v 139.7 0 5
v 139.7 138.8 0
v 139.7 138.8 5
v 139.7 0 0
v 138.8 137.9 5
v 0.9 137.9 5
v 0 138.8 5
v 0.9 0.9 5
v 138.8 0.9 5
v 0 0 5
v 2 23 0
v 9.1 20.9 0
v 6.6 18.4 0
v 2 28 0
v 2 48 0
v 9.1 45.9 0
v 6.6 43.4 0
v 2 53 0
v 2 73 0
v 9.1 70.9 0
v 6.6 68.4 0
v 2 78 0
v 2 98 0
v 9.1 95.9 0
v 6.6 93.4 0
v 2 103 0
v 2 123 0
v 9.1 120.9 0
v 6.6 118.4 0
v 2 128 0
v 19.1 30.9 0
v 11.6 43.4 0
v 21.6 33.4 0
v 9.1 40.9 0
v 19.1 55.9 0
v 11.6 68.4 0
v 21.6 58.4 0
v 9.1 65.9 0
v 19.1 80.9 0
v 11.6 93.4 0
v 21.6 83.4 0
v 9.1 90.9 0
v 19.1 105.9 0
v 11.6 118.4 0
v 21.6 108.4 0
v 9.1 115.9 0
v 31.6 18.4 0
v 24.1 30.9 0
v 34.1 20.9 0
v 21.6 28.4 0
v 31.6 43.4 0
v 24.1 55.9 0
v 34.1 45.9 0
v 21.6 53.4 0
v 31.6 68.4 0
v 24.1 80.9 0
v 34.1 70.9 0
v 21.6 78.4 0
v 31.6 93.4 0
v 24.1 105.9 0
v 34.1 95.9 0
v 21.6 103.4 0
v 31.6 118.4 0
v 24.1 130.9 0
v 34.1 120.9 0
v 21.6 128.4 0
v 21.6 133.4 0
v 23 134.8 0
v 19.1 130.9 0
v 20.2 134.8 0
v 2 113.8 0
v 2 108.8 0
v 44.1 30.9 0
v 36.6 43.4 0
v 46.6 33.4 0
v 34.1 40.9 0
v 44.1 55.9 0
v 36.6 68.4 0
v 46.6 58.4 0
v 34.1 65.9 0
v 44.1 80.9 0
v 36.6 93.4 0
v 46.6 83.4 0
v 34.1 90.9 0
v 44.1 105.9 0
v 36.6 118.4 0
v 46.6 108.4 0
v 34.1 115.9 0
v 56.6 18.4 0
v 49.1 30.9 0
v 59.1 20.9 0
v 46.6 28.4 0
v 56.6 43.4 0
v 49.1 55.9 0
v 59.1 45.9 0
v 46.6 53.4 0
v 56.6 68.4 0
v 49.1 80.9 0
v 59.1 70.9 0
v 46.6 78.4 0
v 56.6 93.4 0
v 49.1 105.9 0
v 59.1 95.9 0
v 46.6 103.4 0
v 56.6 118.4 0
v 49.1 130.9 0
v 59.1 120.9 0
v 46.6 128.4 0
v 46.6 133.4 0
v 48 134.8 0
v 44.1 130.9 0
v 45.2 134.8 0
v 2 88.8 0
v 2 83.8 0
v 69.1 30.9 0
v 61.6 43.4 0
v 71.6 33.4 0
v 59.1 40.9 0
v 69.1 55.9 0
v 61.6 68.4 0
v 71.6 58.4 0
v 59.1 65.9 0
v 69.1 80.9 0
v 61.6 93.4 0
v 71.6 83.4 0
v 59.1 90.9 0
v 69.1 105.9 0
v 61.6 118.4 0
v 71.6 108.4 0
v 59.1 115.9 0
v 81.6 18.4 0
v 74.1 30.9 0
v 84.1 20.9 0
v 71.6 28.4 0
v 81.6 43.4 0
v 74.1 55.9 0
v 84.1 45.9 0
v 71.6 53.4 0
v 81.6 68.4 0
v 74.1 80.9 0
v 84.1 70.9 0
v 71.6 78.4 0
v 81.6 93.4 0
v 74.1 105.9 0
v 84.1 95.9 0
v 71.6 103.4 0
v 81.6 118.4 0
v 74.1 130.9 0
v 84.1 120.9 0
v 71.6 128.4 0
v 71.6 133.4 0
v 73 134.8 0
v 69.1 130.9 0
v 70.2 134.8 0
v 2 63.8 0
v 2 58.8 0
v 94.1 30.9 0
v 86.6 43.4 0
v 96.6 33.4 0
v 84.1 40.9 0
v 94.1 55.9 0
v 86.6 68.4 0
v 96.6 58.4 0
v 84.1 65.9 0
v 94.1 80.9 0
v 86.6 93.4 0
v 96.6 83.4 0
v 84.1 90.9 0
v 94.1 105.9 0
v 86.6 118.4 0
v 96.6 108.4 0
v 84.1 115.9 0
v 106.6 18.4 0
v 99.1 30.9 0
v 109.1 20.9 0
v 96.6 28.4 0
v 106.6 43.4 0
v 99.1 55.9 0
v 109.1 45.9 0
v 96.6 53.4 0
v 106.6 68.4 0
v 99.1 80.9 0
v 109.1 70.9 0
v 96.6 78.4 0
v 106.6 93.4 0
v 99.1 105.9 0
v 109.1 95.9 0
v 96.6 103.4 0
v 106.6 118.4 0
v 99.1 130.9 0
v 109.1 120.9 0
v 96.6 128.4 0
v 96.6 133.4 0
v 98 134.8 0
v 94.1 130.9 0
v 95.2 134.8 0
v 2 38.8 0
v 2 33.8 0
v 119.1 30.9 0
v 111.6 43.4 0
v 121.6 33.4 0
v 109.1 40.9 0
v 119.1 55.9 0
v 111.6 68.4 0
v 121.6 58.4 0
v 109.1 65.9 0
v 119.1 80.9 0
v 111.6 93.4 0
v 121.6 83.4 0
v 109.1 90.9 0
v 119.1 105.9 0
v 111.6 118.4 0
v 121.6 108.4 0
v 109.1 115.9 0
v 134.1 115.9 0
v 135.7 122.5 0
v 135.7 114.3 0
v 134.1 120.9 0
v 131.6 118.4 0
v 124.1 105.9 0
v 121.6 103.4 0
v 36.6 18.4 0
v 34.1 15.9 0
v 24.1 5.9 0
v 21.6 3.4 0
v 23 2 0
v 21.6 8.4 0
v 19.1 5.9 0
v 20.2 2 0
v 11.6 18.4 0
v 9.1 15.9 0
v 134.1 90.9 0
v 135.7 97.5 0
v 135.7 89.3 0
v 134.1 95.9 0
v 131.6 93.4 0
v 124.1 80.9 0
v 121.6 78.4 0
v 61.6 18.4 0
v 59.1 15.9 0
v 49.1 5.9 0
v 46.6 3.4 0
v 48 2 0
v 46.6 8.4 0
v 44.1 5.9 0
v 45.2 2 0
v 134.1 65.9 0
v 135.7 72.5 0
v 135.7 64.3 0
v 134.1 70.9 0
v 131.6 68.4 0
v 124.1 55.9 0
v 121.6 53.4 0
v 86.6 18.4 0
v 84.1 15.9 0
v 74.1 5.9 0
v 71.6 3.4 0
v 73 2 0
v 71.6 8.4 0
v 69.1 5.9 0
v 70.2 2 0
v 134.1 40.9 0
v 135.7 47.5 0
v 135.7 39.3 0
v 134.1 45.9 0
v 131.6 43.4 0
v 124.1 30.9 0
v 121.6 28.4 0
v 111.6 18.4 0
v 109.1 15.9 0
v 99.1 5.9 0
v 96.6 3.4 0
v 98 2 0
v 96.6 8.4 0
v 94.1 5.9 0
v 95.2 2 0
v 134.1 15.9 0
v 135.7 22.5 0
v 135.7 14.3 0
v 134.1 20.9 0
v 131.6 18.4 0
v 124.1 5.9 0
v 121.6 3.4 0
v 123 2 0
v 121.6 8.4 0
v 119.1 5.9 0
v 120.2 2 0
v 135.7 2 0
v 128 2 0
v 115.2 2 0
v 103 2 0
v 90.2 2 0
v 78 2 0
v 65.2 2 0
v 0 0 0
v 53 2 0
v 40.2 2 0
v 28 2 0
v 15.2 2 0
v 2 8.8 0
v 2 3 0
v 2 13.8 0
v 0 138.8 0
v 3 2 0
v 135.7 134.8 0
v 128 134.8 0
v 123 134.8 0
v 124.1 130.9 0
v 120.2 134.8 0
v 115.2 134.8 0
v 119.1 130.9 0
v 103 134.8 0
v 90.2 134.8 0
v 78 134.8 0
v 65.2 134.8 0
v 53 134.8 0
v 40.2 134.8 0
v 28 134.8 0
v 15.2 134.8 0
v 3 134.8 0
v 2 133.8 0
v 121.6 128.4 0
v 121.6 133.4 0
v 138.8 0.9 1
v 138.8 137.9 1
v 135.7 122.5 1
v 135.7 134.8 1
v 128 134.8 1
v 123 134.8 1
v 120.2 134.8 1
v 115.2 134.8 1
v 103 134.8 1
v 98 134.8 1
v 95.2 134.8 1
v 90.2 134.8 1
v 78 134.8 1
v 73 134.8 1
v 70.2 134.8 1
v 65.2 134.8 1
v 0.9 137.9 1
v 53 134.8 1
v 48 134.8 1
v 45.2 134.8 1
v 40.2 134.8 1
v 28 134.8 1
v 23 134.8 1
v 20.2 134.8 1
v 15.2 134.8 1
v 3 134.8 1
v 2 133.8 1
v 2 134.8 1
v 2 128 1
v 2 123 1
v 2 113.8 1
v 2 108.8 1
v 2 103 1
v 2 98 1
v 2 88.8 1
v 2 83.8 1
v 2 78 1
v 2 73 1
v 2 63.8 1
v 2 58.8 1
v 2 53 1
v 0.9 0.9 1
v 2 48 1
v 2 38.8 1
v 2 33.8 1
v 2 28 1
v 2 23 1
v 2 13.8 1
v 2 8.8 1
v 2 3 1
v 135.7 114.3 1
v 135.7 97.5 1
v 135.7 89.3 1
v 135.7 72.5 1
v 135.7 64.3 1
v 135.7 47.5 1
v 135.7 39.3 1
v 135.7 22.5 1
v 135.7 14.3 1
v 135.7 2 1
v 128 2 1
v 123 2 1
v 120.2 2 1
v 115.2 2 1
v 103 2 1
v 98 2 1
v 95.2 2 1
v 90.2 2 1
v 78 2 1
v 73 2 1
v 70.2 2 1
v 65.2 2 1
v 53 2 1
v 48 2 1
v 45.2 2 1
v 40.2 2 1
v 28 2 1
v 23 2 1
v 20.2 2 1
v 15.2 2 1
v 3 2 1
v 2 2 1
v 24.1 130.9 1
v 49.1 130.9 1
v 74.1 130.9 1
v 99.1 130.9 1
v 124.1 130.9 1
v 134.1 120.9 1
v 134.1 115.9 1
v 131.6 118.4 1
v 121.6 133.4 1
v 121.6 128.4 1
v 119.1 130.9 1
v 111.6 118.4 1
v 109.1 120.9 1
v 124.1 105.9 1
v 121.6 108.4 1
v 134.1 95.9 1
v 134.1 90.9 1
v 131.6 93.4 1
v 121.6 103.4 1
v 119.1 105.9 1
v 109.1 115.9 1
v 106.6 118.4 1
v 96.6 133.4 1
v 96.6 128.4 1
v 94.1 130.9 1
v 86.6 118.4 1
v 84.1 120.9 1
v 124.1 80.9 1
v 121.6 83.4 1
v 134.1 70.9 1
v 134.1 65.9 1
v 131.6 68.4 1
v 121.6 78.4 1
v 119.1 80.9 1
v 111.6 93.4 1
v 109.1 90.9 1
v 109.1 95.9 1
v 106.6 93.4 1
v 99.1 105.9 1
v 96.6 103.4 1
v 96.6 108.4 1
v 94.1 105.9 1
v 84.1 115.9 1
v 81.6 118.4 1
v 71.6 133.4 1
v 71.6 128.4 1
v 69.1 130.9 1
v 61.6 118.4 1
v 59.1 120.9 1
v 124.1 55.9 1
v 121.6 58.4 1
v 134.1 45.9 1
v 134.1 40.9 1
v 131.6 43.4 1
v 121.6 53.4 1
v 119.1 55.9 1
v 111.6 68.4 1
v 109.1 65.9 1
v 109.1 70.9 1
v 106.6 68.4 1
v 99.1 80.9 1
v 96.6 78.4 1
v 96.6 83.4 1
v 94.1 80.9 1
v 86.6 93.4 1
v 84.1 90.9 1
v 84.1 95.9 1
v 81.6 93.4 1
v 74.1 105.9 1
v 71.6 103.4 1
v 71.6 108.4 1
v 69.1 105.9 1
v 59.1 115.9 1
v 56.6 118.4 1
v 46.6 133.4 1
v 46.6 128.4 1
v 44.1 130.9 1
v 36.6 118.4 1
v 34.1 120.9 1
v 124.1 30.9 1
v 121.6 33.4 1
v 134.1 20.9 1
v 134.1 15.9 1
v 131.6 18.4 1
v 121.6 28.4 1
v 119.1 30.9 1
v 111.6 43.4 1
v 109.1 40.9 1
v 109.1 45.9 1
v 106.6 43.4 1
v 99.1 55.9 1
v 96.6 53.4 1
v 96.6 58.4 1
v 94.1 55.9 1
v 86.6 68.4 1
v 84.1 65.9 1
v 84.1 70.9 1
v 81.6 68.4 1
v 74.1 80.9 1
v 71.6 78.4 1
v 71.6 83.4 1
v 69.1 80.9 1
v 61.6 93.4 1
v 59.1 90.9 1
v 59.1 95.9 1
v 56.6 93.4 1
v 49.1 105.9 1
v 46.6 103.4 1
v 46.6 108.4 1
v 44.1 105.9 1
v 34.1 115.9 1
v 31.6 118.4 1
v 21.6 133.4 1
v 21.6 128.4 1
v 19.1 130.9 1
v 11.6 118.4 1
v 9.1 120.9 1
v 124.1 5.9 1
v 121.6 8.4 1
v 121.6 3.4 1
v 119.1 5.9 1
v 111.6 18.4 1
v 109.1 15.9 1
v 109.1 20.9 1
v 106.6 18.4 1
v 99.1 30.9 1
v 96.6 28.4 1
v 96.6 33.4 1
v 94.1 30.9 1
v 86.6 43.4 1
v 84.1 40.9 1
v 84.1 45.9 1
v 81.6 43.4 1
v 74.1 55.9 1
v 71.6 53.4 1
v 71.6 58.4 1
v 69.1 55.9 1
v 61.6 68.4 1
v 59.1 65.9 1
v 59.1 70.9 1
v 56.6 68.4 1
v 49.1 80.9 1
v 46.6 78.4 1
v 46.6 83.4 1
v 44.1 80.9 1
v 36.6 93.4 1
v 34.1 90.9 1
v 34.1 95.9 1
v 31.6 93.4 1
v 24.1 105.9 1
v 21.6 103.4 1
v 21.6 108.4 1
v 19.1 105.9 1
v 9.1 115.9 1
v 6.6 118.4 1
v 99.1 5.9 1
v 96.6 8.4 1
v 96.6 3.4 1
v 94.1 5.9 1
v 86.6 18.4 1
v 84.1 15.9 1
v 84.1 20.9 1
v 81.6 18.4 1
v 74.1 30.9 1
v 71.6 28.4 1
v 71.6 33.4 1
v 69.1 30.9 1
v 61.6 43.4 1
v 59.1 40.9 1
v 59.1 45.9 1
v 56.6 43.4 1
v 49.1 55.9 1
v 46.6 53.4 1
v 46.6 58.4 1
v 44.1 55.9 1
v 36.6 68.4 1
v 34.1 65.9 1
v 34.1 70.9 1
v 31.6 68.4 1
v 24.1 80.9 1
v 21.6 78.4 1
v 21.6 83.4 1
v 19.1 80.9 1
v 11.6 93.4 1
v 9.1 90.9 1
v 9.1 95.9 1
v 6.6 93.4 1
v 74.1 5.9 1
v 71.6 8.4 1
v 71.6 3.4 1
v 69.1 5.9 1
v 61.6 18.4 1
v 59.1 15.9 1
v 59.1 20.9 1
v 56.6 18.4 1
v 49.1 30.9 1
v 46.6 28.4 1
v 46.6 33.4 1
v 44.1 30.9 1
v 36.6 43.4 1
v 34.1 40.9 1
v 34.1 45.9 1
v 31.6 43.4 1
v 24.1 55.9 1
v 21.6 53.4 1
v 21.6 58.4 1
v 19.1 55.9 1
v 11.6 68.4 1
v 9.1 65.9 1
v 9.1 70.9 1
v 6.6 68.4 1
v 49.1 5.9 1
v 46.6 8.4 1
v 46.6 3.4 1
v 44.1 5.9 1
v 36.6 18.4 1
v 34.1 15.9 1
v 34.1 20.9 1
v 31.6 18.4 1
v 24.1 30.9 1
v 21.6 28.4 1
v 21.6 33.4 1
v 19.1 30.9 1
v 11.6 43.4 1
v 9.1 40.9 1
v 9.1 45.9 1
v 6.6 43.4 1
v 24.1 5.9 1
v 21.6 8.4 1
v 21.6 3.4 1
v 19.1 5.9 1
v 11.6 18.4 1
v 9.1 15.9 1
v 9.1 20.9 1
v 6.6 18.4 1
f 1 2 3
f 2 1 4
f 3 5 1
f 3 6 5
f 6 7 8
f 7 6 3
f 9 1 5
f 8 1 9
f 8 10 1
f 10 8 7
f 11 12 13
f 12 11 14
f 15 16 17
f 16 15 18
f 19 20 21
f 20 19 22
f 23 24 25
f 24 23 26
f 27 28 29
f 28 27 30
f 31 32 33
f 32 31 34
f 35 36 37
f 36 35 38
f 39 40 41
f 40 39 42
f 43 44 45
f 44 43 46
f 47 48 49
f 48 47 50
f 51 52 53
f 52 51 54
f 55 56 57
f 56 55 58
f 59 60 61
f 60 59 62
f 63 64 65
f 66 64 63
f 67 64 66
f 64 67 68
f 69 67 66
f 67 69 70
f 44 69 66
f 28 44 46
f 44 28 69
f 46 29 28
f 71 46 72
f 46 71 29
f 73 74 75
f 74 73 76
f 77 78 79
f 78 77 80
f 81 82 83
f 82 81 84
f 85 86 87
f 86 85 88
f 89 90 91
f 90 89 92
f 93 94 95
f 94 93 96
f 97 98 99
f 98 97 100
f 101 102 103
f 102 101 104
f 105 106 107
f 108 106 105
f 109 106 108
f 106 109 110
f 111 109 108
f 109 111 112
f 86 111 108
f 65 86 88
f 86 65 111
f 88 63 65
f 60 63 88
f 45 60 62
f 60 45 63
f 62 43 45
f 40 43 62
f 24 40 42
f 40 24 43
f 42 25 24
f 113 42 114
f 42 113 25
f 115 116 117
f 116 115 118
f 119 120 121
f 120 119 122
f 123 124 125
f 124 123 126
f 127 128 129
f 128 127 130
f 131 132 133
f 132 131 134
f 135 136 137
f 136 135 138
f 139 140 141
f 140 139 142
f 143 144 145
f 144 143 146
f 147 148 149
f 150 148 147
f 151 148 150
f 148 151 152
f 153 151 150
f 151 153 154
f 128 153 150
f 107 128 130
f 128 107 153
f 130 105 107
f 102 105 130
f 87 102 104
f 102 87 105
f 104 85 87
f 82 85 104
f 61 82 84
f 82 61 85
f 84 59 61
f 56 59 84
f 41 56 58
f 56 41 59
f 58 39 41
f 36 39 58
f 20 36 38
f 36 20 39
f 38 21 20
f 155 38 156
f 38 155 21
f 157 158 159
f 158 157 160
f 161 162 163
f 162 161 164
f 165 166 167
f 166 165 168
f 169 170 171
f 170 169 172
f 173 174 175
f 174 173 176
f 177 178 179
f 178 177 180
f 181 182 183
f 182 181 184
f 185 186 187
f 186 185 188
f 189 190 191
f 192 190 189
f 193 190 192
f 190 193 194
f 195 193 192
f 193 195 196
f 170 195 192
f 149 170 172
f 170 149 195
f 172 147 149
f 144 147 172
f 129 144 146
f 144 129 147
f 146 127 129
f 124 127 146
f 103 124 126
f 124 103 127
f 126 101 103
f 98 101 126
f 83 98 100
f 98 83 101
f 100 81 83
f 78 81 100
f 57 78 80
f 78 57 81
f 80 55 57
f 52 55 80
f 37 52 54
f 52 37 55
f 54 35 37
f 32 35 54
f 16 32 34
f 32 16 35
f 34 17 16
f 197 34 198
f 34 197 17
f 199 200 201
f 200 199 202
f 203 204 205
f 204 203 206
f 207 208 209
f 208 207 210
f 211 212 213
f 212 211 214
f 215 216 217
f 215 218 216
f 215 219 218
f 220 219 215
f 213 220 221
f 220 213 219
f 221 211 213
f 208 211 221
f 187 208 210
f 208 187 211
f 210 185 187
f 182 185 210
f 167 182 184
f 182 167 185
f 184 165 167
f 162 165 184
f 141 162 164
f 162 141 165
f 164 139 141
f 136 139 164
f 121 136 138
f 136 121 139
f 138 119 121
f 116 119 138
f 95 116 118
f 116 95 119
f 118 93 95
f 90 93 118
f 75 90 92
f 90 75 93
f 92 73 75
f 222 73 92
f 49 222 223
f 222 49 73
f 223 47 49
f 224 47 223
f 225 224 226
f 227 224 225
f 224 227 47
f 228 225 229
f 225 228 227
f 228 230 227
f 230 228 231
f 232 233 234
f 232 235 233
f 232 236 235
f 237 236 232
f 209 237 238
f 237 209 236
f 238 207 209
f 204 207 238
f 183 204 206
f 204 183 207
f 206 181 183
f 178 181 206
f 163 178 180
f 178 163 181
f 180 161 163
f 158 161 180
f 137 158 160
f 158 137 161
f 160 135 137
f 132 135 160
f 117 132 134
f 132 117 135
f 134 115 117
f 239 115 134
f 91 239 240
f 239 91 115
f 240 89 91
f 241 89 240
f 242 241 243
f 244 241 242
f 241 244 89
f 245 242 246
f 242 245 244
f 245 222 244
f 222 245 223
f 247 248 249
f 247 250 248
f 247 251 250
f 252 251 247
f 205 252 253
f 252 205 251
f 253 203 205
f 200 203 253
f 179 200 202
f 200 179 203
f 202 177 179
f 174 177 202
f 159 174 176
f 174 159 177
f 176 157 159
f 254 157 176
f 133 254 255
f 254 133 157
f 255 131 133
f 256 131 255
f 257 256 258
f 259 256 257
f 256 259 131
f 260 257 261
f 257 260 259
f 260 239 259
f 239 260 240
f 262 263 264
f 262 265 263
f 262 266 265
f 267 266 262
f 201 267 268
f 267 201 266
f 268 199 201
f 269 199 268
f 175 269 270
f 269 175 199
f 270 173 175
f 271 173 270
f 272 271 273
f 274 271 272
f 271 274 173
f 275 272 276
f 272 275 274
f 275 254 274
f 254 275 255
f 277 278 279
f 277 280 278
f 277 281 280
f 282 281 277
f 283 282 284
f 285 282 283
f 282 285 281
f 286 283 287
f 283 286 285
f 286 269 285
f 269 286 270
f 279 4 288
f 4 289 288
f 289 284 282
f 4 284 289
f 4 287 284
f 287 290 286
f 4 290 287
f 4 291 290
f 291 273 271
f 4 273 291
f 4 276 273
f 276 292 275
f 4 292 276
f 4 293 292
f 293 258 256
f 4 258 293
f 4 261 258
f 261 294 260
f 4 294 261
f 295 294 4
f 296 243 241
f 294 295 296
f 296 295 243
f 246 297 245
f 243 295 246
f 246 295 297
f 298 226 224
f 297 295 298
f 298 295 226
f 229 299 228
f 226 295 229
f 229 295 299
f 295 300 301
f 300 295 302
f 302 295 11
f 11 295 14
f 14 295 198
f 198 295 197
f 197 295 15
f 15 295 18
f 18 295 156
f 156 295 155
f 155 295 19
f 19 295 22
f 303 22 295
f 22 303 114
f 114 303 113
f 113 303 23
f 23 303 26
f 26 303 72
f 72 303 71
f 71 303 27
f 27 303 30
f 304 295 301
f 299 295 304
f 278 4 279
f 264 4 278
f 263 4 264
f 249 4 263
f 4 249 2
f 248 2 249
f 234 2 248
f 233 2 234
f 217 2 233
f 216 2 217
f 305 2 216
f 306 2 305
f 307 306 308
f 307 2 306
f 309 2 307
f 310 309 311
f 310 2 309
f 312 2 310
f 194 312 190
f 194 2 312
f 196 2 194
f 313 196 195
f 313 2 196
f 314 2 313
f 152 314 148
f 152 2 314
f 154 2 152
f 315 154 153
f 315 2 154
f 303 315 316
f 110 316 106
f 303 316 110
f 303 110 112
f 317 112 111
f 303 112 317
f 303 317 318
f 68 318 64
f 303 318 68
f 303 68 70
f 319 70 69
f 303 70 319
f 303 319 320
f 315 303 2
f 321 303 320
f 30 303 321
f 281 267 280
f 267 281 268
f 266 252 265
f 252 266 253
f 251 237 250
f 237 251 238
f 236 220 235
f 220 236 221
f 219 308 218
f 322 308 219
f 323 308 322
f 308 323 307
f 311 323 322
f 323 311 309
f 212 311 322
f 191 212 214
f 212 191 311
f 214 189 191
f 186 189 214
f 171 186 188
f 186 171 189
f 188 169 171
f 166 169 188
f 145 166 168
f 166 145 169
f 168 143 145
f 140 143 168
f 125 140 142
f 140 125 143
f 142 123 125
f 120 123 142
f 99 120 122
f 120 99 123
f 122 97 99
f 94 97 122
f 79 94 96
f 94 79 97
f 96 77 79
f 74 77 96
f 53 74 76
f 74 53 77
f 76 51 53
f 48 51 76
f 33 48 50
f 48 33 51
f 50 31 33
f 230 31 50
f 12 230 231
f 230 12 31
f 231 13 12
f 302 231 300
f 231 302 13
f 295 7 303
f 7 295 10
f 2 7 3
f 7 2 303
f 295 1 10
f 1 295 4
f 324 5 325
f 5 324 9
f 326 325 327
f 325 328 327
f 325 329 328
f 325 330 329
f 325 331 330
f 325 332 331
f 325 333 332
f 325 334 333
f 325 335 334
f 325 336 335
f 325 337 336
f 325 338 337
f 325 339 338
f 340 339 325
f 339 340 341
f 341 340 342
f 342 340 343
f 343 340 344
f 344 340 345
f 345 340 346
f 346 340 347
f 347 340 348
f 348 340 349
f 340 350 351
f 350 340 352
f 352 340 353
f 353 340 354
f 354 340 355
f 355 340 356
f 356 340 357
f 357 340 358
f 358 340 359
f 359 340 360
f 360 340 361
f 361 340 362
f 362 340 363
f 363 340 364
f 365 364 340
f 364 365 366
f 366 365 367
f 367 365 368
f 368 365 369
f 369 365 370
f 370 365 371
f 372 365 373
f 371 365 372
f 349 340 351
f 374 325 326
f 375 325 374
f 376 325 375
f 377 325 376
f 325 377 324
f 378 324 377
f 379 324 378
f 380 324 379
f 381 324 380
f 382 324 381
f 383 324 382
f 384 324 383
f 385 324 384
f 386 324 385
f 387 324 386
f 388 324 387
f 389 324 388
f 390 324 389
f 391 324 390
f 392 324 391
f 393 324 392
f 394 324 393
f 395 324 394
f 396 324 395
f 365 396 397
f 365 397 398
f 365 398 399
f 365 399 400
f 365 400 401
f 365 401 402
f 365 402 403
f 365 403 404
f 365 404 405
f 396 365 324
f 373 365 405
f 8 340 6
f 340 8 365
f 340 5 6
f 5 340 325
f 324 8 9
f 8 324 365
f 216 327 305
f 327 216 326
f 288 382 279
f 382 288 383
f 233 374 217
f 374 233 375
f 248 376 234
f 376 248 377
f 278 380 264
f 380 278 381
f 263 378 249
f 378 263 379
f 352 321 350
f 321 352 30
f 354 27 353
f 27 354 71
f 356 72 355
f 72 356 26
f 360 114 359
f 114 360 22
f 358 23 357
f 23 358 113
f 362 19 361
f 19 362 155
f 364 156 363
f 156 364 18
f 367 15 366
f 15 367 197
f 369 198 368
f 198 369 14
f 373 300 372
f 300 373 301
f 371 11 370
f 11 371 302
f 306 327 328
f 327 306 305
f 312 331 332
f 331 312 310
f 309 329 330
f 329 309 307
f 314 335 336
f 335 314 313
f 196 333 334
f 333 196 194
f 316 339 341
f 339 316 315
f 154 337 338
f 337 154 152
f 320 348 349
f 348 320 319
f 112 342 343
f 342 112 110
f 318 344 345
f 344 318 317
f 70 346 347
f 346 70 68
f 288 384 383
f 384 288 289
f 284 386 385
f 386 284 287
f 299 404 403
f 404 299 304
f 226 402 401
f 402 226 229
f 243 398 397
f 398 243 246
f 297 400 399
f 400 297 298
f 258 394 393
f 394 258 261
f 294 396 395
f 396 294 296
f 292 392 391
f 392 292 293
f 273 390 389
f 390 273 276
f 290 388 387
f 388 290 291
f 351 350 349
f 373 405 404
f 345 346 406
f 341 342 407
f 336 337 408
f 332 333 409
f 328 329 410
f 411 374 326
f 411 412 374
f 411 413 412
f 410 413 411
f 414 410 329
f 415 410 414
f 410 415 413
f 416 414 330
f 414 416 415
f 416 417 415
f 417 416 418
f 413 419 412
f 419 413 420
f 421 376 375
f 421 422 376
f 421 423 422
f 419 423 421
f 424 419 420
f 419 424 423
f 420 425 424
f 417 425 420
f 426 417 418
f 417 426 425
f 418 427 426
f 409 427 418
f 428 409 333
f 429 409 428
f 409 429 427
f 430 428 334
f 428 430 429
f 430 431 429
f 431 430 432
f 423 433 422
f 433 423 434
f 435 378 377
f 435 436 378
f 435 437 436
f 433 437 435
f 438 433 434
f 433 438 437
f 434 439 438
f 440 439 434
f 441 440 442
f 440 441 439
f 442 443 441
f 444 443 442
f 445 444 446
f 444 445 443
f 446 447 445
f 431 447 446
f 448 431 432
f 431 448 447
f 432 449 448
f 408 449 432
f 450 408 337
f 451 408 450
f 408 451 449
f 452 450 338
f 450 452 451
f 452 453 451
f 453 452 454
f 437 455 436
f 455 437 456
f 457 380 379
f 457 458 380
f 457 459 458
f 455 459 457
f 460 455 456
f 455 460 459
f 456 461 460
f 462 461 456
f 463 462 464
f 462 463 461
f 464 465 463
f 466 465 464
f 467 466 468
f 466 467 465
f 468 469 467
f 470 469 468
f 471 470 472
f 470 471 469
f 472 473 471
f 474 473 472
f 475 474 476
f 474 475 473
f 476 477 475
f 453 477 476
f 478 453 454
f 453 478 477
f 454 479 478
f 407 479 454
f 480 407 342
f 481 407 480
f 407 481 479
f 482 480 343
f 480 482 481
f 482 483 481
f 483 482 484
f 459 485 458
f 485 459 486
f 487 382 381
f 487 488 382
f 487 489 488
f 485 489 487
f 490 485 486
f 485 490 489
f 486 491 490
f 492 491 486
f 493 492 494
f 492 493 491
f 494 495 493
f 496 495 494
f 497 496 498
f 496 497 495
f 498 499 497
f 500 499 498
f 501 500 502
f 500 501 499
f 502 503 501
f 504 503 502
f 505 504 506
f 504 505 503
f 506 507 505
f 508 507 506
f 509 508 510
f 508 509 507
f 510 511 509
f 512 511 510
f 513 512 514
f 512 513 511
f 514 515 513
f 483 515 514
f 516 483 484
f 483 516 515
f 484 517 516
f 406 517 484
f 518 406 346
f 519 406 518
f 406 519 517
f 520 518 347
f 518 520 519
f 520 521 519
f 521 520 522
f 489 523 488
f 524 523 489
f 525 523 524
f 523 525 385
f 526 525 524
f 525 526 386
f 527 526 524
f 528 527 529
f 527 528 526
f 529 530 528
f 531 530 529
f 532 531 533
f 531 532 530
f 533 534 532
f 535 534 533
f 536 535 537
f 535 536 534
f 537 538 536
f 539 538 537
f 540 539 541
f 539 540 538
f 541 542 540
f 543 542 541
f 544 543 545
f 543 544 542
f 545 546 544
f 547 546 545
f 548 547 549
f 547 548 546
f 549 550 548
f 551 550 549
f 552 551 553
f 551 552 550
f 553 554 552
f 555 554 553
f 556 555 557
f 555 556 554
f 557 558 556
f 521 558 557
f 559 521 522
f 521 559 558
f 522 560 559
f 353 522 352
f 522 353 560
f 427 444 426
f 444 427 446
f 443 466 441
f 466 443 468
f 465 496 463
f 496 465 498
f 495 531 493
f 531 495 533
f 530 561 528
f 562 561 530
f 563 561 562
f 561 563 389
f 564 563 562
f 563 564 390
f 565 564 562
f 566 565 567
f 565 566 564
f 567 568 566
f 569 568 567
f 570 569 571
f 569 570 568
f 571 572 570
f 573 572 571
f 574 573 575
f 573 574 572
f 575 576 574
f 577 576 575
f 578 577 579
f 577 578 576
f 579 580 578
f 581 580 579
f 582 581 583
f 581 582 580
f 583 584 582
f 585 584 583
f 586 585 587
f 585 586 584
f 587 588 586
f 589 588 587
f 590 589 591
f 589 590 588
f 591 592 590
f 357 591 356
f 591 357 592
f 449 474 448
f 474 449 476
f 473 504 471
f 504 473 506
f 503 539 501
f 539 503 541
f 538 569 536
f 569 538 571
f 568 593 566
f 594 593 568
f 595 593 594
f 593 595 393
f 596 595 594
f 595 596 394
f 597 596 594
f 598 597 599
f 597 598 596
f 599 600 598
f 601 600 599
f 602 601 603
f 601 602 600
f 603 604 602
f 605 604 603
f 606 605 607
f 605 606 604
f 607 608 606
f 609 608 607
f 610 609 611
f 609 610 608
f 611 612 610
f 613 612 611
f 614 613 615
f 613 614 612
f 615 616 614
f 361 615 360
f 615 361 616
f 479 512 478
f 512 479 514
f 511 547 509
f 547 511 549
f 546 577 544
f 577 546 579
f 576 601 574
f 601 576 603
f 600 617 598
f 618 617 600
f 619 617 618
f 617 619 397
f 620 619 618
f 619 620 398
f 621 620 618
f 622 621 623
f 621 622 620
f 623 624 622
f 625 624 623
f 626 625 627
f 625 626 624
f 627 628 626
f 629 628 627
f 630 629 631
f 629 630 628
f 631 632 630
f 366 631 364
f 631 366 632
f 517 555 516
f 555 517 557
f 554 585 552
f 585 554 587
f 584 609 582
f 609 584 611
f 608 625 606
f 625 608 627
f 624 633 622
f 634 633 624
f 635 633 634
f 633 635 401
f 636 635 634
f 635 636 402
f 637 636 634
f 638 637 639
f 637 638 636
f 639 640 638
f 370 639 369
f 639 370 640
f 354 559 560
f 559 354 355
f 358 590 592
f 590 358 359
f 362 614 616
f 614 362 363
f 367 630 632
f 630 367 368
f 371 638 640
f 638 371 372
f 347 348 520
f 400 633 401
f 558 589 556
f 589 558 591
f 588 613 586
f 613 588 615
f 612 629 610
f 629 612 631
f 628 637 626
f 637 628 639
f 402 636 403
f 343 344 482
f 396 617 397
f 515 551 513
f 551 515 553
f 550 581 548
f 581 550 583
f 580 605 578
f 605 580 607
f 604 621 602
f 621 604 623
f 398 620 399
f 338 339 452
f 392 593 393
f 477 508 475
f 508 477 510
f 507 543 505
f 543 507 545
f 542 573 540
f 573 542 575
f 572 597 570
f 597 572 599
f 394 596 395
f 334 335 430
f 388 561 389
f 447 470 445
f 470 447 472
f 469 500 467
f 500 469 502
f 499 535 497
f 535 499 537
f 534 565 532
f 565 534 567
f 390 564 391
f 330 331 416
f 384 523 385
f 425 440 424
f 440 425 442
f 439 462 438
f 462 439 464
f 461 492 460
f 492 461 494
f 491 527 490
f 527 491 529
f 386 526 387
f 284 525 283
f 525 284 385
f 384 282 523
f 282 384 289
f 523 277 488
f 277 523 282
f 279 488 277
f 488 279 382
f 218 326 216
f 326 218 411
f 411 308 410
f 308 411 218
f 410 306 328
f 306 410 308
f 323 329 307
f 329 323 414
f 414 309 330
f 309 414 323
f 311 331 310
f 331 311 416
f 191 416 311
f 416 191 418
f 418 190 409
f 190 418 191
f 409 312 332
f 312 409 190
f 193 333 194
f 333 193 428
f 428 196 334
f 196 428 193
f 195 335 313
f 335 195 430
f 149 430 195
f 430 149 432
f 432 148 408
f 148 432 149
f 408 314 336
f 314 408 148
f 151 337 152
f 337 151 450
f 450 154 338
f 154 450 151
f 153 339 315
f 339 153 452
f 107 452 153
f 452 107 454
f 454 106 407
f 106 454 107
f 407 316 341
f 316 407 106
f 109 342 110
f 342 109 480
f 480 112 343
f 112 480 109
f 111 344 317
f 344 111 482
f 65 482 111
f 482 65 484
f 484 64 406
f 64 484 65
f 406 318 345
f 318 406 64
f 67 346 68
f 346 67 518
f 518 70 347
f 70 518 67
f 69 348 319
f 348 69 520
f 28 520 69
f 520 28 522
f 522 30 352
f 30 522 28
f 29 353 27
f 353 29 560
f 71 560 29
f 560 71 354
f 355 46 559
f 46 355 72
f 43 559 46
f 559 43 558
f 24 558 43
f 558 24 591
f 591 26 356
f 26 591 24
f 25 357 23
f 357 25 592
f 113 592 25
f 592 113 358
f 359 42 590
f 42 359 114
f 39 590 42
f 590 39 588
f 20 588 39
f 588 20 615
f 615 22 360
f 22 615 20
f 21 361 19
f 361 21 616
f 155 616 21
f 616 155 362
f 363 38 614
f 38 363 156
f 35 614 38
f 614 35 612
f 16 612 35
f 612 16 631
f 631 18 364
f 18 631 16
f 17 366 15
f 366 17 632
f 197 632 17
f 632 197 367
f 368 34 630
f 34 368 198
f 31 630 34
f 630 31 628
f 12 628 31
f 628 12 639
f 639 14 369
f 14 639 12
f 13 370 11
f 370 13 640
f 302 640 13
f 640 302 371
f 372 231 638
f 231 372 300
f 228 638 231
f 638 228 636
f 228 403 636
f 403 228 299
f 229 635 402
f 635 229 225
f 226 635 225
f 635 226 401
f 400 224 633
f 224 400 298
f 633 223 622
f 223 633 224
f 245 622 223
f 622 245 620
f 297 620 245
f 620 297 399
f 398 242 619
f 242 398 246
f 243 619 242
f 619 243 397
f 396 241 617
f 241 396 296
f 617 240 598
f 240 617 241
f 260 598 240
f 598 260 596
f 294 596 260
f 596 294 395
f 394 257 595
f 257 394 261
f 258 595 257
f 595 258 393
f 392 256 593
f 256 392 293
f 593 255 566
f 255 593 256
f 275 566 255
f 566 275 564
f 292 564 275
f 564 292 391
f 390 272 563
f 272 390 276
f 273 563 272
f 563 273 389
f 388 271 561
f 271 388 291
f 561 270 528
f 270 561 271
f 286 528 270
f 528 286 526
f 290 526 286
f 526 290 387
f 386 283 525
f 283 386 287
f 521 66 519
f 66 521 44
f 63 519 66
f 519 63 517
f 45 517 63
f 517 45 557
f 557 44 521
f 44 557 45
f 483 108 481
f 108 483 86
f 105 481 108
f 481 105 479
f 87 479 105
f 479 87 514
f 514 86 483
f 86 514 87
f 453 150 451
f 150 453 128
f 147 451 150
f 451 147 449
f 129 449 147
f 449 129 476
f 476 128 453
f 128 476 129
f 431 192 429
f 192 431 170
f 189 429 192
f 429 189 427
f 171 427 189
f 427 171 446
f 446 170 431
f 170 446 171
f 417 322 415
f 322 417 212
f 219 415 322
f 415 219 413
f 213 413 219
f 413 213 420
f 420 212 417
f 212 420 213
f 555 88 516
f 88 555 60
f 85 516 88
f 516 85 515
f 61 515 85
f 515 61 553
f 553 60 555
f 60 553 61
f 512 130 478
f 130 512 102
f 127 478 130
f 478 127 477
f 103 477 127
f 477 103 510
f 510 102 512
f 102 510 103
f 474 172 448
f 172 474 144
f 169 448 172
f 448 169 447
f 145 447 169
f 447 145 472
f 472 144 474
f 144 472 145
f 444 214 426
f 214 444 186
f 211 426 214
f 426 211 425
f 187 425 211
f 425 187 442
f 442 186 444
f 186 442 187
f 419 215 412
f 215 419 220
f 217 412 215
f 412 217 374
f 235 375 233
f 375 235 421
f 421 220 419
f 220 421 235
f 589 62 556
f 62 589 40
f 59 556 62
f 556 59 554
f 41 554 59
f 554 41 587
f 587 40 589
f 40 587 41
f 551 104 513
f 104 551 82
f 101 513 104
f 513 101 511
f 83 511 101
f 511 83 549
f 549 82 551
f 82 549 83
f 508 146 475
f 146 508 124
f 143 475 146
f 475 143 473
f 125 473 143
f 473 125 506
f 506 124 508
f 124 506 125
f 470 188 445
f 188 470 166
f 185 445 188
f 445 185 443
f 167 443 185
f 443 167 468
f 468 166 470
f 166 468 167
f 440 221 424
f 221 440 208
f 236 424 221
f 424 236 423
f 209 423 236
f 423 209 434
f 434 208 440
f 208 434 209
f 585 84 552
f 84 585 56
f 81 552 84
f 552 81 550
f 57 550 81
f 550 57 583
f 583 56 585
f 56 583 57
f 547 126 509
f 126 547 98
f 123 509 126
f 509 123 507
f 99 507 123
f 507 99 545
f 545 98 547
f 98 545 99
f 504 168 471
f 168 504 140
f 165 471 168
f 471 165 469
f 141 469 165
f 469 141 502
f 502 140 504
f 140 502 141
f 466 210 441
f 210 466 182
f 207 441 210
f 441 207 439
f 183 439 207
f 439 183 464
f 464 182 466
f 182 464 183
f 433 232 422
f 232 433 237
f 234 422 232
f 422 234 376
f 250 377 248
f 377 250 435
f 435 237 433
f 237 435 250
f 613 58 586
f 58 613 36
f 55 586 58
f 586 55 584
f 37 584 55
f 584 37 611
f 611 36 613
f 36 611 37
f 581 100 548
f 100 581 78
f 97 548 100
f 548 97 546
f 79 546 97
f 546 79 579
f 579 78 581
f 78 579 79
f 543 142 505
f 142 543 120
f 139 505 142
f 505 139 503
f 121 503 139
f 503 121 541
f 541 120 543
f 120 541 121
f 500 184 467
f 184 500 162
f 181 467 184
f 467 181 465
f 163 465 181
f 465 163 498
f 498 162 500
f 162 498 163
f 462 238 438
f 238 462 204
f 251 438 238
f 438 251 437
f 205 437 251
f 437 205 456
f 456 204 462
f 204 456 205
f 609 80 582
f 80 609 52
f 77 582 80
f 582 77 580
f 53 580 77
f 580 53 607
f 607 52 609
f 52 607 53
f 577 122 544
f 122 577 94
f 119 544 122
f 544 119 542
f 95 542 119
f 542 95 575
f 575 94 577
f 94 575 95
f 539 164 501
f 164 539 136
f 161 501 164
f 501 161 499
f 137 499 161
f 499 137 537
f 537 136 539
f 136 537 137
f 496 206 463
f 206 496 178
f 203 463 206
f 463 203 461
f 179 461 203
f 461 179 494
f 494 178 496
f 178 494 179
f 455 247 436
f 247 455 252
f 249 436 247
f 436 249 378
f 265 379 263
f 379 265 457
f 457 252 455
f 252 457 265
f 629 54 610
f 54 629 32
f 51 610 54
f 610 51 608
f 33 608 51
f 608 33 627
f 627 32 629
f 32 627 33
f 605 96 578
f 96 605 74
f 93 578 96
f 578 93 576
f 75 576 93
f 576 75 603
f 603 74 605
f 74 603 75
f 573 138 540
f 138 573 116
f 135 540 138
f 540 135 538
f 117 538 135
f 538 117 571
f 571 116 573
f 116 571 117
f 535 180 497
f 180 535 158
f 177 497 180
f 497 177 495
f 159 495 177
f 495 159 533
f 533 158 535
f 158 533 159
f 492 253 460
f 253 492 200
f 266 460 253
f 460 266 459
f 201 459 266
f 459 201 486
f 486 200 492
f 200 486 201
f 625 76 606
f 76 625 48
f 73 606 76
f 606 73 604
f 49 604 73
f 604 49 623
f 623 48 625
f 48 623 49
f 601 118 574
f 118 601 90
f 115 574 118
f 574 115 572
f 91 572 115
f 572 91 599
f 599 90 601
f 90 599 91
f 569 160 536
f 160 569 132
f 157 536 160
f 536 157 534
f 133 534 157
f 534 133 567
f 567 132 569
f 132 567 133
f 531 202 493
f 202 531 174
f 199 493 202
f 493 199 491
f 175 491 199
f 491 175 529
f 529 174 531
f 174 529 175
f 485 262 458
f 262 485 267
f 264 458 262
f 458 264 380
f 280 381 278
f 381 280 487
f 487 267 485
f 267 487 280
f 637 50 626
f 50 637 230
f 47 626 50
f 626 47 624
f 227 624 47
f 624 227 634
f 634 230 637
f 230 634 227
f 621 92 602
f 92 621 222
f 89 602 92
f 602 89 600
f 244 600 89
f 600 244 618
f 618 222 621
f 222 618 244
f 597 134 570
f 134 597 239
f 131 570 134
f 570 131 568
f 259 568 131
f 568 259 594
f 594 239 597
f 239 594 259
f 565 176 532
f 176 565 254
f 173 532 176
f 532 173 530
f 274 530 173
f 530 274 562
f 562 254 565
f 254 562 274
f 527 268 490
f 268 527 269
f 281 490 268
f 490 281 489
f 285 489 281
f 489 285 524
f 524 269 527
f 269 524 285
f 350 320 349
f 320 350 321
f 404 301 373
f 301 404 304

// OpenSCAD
// file: GenericLid.scad
module GenericLid(width,height,depth,gridStep = 10,gridSize = 3) {
    gridRange = width + height;
    union() {
        difference() {
            cube([width+2,height+2,5]);
            translate([.9,.9,1]) cube([width+.2,height+.2,depth]);
            translate([2,2,0]) cube([width-4,height-4,1]);
        }
        intersection() {
            translate([2,2,0]) cube([width-4,height-4,1]);
            linear_extrude(1) {
                for (i=[0:gridStep:gridRange]) {
                    polygon([ [0,i], [i,0], [i+gridSize,0], [0,i+gridSize] ]);
                    polygon([ [0,height-i], [i,height], 
                        [i+gridSize,height], [0,height-i-gridSize] ]);
                }
            }
        }
    }     
}
// main file
// Merchant of Venus culture storage

// First well holds factory, factory goods, and culture token (classic)
// Second well holds three market tokens and up to three racial goods (standard)
// Third well holds up to six goods tokens.
include<GenericLid.scad>

tokenThickness = 2.3;
floorThickness = 1;
wallThickness = 1.6;
eps = 0.6;
goodsHeight = 31.6 + eps;
goodsWidth = goodsHeight;
factoryDiameter = 19.0 + eps;

cultureHeight = 22.6 + eps;
cultureWidth = 46.7 + eps;

cultureHeight2 = 28.6 + eps;
cultureWidth2 = 34.8 + eps;

marketHeight = 28.8 + eps;
marketWidth = 51.2 + eps;
labelSize = 10;
labelThickness = 1;
gapHeight = 8;
fingerGap = 15;

module newTray(numRows) {
    cube([wallThickness + cultureWidth + wallThickness + marketWidth + wallThickness +
            goodsWidth + wallThickness,
            numRows*(goodsHeight + wallThickness) + wallThickness,
            floorThickness+6*tokenThickness]);
}

module trayLid(numRows) {
    GenericLid(wallThickness + cultureWidth + wallThickness + marketWidth + wallThickness +
            goodsWidth + wallThickness,
            numRows*(goodsHeight + wallThickness) + wallThickness,
            8,25,5);
}

module cultureTray(row,label,numRacial,numGoods) {
    translate([wallThickness,wallThickness + row * (goodsHeight+wallThickness),floorThickness]) {
        // First well - Market and racial goods (standard game)
        translate([0,0,0]) {
            translate([-99,0.5*(goodsHeight-fingerGap),0])
                cube([99,fingerGap,99]);
            translate([0,0,(3 - numRacial) * tokenThickness])
                cube([goodsWidth,goodsHeight,50]);
            translate([0,0.5 * (goodsHeight - marketHeight),3 * tokenThickness])
                cube([marketWidth,marketHeight,3 * tokenThickness]);
            translate([goodsWidth + 0.5*(marketWidth-goodsWidth),0.5*goodsHeight,3 * tokenThickness - labelThickness])
                linear_extrude(labelThickness) text(text=label,size=labelSize,halign="center",valign="center");
        }
        
        // Second well - Factory token, factory good, culture token (classic)
        translate([marketWidth+wallThickness,0,0]) {
            // cut out half moon for factory token so you can press it out
            translate([0.5*cultureWidth,0.5*goodsHeight,2 * tokenThickness]) 
                intersection() {
                    cylinder(h=50,d=factoryDiameter);
                    translate([-50,4,0]) cube([99,99,99]);
                }
            // cut out full moon for factory token itself
            translate([0.5*cultureWidth,0.5*goodsHeight,3 * tokenThickness])
                cylinder(h=50,d=factoryDiameter);
            
            // cut out room for the factory good
            translate([0.5*(cultureWidth-goodsWidth),0,4 * tokenThickness]) {
                cube([goodsWidth,goodsHeight,99]);
                translate([0,goodsHeight - gapHeight,-tokenThickness]) 
                    cube([goodsWidth,gapHeight,tokenThickness]);
            }
            // cut out room for the culture token
            translate([0,0.5 * (goodsHeight - cultureHeight),5 * tokenThickness]) {
                cube([cultureWidth,cultureHeight,tokenThickness]);
                translate([0,cultureHeight - gapHeight,-tokenThickness]) 
                    cube([cultureWidth,gapHeight,tokenThickness]);
            }
            translate([0.5 * (cultureWidth - cultureWidth2),
                    0.5 * (goodsHeight - cultureHeight2),5 * tokenThickness]) {
                cube([cultureWidth2,cultureHeight2,tokenThickness]);
                translate([0,cultureHeight2 - gapHeight,-tokenThickness]) 
                    cube([cultureWidth2,gapHeight,tokenThickness]);
            }
        }
     
        // Third well - Goods tokens (both versions)
        translate([marketWidth+wallThickness+cultureWidth+wallThickness,0,0]) {
            translate([0,0,(6 - numGoods) * tokenThickness]) {
                cube([goodsWidth,goodsHeight,numGoods * tokenThickness]);
                translate([goodsWidth,0.5*(goodsHeight-fingerGap),0])
                    cube([99,fingerGap,99]);
            }
        }
    }
}

// Two 7 row trays
if (false) difference() {
    newTray(7);
    cultureTray(0,"7",3,6);
    cultureTray(1,"6",2,5);
    cultureTray(2,"5",3,6);
    cultureTray(3,"4",2,6);
    cultureTray(4,"3",3,6);
    cultureTray(5,"2",2,6);
    cultureTray(6,"1",2,5);
}

trayLid(4);

if (false) difference() {
    newTray(7);
    cultureTray(0,"14",2,4);
    cultureTray(1,"13",3,5);
    cultureTray(2,"12",2,6);
    cultureTray(3,"11",3,5);
    cultureTray(4,"10",3,4);
    cultureTray(5,"9",2,6);
    cultureTray(6,"8",2,6);
}

// Three 5/5/4 row trays
if (false) difference() {
    newTray(5);
    cultureTray(0,"5",3,6);
    cultureTray(1,"4",2,6);
    cultureTray(2,"3",3,6);
    cultureTray(3,"2",2,6);
    cultureTray(4,"1",2,5);
}

if (false) difference() {
    newTray(5);
    cultureTray(0,"10",3,4);
    cultureTray(1,"9",2,6);
    cultureTray(2,"8",2,6);
    cultureTray(3,"7",3,6);
    cultureTray(4,"6",2,5);
}

if (false) difference() {
    newTray(4);
    cultureTray(0,"14",2,4);
    cultureTray(1,"13",3,5);
    cultureTray(2,"12",2,6);
    cultureTray(3,"11",3,5);
}
